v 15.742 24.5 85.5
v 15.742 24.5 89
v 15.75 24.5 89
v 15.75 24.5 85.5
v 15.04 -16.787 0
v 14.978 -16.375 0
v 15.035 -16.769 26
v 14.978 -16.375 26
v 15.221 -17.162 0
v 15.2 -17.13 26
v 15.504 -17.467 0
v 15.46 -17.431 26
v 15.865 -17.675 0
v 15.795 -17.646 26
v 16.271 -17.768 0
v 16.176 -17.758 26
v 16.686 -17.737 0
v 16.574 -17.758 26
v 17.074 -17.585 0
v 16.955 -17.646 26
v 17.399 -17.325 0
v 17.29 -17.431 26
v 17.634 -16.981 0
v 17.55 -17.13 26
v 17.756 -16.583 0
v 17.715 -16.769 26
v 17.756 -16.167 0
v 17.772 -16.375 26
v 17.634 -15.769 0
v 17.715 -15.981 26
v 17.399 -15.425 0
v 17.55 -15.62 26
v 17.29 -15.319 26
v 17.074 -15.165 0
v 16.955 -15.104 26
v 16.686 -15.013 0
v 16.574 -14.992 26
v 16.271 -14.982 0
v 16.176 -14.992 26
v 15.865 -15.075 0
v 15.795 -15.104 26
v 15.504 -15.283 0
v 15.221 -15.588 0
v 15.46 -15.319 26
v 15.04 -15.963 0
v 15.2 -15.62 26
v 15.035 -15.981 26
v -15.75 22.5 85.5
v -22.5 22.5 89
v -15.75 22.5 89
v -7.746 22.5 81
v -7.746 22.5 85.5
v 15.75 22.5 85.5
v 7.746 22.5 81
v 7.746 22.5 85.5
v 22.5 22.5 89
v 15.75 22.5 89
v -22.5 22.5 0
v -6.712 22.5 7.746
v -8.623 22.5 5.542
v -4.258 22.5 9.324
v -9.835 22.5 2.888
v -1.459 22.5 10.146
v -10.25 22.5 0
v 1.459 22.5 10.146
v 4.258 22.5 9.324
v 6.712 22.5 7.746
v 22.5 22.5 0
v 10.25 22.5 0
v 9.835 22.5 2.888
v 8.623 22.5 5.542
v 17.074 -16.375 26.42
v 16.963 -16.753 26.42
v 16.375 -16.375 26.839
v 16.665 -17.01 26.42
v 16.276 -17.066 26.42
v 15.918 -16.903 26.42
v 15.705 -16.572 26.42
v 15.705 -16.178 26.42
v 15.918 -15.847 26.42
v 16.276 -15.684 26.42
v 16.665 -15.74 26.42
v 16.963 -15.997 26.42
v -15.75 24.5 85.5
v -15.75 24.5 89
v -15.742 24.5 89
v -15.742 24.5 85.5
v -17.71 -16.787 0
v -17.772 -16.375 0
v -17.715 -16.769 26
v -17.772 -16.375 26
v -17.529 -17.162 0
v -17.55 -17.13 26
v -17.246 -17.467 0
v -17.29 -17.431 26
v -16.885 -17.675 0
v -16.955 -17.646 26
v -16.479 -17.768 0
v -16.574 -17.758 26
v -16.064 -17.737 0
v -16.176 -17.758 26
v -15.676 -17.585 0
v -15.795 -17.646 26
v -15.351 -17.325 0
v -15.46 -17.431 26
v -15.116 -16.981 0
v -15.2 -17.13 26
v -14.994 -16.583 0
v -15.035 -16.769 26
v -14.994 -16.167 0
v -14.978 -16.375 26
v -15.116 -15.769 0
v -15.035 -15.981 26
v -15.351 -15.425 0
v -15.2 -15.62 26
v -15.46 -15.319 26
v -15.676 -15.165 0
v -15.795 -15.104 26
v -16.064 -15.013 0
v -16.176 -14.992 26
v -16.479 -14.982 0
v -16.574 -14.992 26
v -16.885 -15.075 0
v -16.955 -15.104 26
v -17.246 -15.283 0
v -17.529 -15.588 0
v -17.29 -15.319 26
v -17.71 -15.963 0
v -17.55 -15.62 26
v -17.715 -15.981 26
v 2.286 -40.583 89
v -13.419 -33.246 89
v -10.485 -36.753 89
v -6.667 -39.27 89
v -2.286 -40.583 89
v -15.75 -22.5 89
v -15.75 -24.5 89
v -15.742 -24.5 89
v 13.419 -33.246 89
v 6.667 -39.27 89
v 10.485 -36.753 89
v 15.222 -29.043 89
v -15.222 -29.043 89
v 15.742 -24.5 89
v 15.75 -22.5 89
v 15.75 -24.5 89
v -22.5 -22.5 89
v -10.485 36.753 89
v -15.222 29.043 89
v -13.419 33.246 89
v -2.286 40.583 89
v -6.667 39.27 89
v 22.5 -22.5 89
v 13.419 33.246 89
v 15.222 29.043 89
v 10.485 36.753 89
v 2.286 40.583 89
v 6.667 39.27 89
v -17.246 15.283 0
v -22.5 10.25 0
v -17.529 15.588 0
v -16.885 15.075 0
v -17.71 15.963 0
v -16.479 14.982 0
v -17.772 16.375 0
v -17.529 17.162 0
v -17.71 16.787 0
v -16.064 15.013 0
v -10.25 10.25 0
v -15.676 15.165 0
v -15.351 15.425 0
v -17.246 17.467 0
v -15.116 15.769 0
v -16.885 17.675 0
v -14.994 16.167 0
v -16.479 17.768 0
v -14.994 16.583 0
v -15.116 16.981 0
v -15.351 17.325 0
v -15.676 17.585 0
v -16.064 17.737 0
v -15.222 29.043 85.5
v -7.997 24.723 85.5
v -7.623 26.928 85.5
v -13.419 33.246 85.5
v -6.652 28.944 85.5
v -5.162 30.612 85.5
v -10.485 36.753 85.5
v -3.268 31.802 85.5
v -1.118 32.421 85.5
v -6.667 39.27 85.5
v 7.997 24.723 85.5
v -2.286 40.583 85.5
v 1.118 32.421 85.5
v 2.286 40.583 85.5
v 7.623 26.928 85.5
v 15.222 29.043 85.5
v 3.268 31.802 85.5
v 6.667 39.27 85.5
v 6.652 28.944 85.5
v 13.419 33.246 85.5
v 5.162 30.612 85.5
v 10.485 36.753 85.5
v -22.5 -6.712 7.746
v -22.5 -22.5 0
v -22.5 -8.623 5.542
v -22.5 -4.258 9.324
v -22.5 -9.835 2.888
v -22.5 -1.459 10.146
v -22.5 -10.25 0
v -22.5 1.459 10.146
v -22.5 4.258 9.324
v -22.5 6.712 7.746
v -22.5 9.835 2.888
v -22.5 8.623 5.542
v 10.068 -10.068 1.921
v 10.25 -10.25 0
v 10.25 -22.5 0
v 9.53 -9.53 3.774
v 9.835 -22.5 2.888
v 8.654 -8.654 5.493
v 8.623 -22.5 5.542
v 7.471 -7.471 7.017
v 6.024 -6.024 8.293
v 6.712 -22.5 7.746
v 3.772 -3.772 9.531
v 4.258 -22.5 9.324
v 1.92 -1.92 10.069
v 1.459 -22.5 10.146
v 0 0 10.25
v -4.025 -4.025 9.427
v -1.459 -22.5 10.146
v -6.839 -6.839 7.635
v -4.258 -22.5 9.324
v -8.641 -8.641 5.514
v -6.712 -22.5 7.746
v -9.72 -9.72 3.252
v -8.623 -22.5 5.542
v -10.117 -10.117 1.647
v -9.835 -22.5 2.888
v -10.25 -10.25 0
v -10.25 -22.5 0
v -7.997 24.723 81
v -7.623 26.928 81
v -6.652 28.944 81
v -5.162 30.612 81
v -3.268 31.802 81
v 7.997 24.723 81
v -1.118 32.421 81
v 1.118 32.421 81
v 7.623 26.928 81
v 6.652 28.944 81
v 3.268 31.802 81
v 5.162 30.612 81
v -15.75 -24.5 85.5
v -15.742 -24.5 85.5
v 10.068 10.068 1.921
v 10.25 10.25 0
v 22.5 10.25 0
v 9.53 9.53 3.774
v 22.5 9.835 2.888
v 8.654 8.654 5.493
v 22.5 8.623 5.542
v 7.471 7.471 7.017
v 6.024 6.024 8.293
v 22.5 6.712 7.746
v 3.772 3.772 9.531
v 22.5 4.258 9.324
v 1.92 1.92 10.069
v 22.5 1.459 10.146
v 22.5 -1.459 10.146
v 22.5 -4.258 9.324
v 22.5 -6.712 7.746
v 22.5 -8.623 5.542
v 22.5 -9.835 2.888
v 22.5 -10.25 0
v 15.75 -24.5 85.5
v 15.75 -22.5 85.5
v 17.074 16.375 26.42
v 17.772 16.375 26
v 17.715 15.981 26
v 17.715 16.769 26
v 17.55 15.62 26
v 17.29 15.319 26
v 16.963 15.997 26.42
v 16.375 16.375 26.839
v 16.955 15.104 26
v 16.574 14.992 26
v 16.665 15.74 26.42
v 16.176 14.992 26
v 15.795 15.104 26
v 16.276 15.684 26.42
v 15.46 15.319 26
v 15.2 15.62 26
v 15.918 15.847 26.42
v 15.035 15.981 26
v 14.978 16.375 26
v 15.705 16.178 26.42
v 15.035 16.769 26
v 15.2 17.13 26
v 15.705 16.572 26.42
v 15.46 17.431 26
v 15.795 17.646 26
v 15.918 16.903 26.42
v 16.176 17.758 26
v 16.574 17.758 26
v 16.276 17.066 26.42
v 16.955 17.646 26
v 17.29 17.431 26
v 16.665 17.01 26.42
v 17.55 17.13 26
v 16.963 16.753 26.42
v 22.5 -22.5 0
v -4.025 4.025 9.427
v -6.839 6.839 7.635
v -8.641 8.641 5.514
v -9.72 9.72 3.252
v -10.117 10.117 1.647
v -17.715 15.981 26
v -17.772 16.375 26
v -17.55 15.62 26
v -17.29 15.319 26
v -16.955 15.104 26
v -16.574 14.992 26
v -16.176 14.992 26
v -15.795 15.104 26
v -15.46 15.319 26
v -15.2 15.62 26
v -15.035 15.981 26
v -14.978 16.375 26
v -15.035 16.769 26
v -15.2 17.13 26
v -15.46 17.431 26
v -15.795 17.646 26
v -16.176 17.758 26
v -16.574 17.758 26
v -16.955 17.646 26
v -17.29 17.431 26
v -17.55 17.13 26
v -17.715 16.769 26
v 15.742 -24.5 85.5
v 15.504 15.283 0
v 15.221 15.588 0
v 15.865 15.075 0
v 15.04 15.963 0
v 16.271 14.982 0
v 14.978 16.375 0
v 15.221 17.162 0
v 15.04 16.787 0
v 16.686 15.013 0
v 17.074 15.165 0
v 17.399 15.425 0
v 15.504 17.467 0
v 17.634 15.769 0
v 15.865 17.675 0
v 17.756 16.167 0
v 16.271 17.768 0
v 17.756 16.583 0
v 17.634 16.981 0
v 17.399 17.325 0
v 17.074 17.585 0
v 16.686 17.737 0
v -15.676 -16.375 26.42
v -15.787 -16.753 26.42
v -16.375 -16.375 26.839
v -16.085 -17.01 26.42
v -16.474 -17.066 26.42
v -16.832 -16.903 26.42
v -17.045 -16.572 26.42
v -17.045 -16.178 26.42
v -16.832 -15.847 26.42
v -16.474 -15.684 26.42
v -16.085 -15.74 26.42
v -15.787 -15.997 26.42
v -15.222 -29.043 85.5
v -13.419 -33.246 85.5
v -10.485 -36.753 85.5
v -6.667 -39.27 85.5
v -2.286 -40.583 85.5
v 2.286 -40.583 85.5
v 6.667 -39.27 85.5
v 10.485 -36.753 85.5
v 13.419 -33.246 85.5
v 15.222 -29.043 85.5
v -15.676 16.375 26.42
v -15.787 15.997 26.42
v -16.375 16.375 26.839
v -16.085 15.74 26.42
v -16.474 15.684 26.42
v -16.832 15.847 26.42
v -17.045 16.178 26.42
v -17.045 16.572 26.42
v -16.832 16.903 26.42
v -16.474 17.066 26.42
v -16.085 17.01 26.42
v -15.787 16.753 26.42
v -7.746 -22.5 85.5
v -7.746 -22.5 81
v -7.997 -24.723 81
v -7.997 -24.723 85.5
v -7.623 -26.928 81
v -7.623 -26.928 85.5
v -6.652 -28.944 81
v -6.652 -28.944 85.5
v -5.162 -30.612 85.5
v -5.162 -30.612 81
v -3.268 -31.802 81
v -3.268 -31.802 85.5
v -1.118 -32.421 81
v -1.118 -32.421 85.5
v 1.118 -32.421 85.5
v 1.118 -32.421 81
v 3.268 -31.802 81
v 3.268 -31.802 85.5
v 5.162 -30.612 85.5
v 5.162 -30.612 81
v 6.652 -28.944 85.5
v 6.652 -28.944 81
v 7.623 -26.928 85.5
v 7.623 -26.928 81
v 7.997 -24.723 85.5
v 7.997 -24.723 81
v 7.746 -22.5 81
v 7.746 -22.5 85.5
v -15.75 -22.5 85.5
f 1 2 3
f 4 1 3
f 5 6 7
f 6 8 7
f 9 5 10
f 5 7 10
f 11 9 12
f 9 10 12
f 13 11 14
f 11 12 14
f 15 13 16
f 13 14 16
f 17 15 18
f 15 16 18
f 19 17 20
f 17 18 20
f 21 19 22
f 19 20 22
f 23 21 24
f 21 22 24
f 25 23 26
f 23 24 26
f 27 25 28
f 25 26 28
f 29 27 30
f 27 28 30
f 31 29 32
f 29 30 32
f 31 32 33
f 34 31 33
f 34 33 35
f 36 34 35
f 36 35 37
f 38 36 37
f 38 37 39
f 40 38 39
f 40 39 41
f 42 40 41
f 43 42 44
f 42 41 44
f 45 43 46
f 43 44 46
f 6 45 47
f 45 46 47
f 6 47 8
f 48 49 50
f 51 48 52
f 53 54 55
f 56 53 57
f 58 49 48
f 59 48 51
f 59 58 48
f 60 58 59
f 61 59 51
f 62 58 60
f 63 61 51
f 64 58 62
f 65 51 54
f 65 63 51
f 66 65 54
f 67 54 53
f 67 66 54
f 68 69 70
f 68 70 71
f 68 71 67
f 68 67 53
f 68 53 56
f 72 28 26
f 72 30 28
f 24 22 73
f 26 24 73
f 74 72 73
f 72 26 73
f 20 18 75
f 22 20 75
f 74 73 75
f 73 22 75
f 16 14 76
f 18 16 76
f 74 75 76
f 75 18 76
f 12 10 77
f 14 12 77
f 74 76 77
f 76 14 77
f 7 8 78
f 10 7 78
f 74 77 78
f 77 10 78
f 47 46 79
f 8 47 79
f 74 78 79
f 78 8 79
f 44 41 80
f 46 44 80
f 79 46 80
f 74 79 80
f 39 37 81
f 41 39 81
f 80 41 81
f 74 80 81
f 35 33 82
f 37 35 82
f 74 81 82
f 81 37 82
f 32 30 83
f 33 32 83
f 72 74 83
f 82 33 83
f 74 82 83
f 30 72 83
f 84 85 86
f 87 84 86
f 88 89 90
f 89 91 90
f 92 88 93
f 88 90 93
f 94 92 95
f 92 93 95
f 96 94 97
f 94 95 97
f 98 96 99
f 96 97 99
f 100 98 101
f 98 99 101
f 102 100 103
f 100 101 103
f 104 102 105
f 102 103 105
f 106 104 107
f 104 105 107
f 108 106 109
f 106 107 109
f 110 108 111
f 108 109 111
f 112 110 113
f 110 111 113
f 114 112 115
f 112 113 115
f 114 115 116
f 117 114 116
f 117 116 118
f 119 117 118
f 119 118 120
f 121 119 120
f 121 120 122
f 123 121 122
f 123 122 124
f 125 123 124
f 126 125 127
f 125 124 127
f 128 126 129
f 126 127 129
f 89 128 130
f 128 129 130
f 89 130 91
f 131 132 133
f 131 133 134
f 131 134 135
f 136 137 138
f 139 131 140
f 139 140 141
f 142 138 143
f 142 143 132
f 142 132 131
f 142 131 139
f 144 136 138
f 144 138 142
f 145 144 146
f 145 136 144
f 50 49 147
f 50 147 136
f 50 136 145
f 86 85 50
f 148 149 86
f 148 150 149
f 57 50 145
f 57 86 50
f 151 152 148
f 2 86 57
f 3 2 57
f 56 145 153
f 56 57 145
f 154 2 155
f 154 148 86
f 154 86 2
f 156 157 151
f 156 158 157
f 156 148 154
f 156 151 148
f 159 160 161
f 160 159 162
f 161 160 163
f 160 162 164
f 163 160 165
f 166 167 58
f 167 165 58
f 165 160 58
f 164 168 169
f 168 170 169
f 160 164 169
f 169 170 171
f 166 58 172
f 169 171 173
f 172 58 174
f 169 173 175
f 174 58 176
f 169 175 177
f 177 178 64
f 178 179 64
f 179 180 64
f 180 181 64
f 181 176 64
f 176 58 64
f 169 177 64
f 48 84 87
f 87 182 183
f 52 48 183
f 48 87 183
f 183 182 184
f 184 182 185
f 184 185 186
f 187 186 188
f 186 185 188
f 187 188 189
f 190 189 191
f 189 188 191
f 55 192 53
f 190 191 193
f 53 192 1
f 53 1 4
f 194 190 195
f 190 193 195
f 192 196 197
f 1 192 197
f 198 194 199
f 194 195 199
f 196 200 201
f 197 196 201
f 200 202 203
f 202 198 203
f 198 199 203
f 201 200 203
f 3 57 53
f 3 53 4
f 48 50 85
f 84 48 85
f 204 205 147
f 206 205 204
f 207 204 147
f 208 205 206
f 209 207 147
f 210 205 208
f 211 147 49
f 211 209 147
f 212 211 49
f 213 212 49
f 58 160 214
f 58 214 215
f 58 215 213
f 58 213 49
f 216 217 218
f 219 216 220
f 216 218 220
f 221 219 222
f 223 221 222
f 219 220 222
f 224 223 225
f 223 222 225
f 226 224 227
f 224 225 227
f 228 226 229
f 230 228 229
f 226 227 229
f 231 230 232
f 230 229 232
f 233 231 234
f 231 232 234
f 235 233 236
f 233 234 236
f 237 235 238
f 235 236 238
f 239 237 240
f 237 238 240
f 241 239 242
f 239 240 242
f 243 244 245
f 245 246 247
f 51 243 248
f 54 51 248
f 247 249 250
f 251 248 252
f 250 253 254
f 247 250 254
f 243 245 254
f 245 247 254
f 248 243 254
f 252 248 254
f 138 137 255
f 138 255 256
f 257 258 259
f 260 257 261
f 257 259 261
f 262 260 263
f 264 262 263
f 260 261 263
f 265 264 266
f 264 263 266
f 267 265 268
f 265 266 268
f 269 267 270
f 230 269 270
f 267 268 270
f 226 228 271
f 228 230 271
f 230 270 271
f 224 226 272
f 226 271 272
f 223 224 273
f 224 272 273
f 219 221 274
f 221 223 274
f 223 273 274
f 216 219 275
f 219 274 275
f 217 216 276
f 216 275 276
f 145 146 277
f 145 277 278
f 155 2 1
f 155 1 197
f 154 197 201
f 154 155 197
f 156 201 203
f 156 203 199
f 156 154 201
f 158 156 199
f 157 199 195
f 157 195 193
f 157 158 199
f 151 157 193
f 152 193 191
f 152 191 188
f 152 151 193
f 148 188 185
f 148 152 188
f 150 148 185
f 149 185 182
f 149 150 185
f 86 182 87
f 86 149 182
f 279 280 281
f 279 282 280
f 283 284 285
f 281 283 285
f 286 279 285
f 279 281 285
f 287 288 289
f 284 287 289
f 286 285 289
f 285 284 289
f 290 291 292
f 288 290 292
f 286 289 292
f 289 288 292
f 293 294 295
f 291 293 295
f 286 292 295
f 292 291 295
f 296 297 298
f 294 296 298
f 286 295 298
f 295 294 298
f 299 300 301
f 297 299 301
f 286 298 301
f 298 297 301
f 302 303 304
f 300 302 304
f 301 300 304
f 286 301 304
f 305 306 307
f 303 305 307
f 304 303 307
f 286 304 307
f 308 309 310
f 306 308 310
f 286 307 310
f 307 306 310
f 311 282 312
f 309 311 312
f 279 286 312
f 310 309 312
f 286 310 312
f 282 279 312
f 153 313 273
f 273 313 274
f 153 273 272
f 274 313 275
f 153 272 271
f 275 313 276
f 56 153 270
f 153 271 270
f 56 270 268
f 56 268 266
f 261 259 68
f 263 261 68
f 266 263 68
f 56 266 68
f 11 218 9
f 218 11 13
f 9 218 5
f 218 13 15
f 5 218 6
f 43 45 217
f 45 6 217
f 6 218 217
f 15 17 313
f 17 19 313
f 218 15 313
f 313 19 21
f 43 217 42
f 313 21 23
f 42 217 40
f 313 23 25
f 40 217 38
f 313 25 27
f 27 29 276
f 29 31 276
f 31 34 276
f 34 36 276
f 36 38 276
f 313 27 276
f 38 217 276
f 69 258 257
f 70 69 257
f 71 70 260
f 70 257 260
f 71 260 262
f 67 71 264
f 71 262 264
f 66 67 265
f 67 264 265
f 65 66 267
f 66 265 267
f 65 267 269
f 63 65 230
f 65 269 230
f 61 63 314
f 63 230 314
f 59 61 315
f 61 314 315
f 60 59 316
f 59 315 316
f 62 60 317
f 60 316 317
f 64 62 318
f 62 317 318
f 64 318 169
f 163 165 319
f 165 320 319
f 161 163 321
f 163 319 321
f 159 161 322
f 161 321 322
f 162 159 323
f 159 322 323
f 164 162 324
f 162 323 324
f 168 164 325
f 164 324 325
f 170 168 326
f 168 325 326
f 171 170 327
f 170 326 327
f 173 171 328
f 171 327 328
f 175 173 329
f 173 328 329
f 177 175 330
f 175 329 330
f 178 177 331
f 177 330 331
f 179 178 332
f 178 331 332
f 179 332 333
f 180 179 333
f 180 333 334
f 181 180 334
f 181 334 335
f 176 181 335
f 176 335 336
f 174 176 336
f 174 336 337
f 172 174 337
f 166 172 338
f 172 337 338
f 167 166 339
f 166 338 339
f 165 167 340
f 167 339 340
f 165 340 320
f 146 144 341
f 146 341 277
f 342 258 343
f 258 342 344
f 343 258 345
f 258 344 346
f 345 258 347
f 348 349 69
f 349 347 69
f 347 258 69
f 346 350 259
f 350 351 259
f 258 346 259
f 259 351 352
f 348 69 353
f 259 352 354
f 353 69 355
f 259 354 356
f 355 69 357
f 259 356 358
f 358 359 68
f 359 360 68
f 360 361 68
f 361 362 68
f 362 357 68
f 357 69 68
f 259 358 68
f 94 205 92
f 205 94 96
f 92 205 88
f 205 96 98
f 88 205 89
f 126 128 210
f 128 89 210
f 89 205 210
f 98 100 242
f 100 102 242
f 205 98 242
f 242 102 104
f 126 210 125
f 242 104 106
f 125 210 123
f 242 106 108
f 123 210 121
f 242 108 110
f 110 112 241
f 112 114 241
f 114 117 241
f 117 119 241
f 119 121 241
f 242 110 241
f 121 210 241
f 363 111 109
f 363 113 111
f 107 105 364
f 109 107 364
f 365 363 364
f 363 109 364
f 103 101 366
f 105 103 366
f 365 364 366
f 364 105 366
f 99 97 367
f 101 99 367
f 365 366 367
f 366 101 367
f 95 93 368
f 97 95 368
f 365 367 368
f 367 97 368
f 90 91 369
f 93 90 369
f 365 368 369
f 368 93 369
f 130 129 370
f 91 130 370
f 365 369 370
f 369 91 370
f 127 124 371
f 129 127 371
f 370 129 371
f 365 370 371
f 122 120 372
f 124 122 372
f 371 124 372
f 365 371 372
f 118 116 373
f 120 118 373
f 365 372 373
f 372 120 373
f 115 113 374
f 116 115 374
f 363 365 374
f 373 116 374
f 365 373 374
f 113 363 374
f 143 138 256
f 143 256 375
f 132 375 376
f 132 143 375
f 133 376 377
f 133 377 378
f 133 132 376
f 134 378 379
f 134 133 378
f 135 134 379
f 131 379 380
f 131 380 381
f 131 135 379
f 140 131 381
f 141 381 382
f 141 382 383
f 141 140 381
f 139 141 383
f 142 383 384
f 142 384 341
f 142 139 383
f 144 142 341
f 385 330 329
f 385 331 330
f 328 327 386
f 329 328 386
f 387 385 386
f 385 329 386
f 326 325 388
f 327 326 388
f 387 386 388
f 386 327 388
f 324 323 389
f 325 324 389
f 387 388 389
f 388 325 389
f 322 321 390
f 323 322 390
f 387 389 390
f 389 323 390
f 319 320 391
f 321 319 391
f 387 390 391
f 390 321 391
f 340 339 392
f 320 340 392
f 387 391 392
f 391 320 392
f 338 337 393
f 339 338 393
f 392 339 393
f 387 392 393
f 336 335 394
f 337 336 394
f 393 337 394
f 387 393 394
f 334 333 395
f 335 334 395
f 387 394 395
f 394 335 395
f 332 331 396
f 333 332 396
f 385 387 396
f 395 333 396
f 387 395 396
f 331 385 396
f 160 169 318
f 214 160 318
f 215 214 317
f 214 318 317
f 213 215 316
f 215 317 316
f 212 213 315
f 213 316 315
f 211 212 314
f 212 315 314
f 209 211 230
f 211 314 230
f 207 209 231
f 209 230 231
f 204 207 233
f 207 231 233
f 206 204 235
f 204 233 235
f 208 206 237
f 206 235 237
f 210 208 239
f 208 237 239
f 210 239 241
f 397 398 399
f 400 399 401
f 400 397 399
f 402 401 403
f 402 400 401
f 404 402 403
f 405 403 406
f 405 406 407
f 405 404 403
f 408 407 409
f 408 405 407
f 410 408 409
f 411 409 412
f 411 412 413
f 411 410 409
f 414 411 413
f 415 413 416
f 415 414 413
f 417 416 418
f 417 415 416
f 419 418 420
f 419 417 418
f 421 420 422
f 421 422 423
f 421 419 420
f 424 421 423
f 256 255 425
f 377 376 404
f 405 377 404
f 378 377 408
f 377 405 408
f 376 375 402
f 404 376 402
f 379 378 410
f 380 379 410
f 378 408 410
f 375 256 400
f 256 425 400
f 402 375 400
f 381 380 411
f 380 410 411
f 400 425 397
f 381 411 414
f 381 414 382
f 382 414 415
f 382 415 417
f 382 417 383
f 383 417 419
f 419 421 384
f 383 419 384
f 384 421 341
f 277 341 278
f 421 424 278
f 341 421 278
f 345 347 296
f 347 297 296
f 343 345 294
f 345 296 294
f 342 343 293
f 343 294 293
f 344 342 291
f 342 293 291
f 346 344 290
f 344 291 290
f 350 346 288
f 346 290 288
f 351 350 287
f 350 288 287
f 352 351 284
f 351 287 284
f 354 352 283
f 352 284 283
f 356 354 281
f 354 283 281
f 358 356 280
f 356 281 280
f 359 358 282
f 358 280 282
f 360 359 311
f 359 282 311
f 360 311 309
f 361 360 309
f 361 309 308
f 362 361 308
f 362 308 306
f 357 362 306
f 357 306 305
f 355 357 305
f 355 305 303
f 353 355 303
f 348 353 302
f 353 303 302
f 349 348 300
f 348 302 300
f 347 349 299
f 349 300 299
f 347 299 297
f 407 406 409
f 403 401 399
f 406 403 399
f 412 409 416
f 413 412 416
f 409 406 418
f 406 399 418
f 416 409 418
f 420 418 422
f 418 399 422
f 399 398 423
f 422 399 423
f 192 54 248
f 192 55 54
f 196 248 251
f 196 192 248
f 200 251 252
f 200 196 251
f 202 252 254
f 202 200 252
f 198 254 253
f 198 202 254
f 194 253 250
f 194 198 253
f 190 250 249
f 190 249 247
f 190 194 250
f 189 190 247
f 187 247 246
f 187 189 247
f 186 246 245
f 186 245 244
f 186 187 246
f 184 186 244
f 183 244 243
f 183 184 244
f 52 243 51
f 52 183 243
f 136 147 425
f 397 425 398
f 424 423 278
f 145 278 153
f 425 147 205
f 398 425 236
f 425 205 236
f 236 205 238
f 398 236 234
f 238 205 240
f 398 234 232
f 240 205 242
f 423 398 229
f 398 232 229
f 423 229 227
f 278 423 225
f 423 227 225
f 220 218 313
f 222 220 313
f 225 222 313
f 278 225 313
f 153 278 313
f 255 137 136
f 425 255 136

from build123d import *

# Parameters (mm, degrees)
F0_W      = 45
F0_H      = 45
F1_DEPTH  = 89
F2_R      = 10.25
F3_DEPTH  = 25
F4_R      = 10.25
F5_DEPTH  = 27.5
F6_R      = 15.75
F7_DEPTH  = 3.5
F9_D      = 2.794
F9_DEPTH  = 26
F9_TIP    = 0.8394022848
F13_D     = 2.794
F13_DEPTH = 26
F13_TIP   = 0.8394022848
F14_D     = 2.794
F14_DEPTH = 26
F14_TIP   = 0.8394022848
F15_D     = 2.794
F15_DEPTH = 26
F15_TIP   = 0.8394022848
F16_W     = 31.5
F16_H     = 49
F17_DEPTH = 3.5
F18_R     = 8
F19_DEPTH = 8


with BuildPart() as f1:
    # F0 (on Top) → F1 (new body)
    with BuildSketch(Plane.XY):
        Rectangle(F0_W, F0_H)
    extrude(amount=F1_DEPTH)

    # F2 (on Front) → F3 (cut, symmetric)
    with BuildSketch(Plane.XZ):
        Circle(F2_R)
    extrude(amount=F3_DEPTH, both=True, mode=Mode.SUBTRACT)

    # F4 (on Right) → F5 (cut, symmetric)
    with BuildSketch(Plane.YZ):
        Circle(F4_R)
    extrude(amount=F5_DEPTH, both=True, mode=Mode.SUBTRACT)

    # F6 (on face) → F7 (join)
    with BuildSketch(Plane.XY.offset(89)):
        with Locations((0, 25)):
            Circle(F6_R)
        with Locations((0, -25)):
            Circle(F6_R)
    extrude(amount=-F7_DEPTH)

    # F9
    with Locations(Plane(origin=(0, 0, 0), x_dir=(1, 0, 0), z_dir=(0, 0, -1))):
        with Locations((16.375, 16.375)):
            Hole(F9_D / 2, depth=F9_DEPTH)
            with Locations((0, 0, -(F9_DEPTH + F9_TIP / 2))):  # 118° drill point
                Cone(0, F9_D / 2, F9_TIP, mode=Mode.SUBTRACT)

    # F13
    with Locations(Plane(origin=(0, 0, 0), x_dir=(1, 0, 0), z_dir=(0, 0, -1))):
        with Locations((16.375, -16.375)):
            Hole(F13_D / 2, depth=F13_DEPTH)
            with Locations((0, 0, -(F13_DEPTH + F13_TIP / 2))):  # 118° drill point
                Cone(0, F13_D / 2, F13_TIP, mode=Mode.SUBTRACT)

    # F14
    with Locations(Plane(origin=(0, 0, 0), x_dir=(1, 0, 0), z_dir=(0, 0, -1))):
        with Locations((-16.375, -16.375)):
            Hole(F14_D / 2, depth=F14_DEPTH)
            with Locations((0, 0, -(F14_DEPTH + F14_TIP / 2))):  # 118° drill point
                Cone(0, F14_D / 2, F14_TIP, mode=Mode.SUBTRACT)

    # F15
    with Locations(Plane(origin=(0, 0, 0), x_dir=(1, 0, 0), z_dir=(0, 0, -1))):
        with Locations((-16.375, 16.375)):
            Hole(F15_D / 2, depth=F15_DEPTH)
            with Locations((0, 0, -(F15_DEPTH + F15_TIP / 2))):  # 118° drill point
                Cone(0, F15_D / 2, F15_TIP, mode=Mode.SUBTRACT)

    # F16 (on face) → F17 (join)
    with BuildSketch(Plane.XY.offset(89)):
        Rectangle(F16_W, F16_H)
    extrude(amount=-F17_DEPTH)

    # F18 (on face) → F19 (join)
    with BuildSketch(Plane.XY.offset(89)):
        with Locations((0, 24.5)):
            Circle(F18_R)
        with Locations((0, -24.5)):
            Circle(F18_R)
    extrude(amount=-F19_DEPTH)


solid = f1.part
